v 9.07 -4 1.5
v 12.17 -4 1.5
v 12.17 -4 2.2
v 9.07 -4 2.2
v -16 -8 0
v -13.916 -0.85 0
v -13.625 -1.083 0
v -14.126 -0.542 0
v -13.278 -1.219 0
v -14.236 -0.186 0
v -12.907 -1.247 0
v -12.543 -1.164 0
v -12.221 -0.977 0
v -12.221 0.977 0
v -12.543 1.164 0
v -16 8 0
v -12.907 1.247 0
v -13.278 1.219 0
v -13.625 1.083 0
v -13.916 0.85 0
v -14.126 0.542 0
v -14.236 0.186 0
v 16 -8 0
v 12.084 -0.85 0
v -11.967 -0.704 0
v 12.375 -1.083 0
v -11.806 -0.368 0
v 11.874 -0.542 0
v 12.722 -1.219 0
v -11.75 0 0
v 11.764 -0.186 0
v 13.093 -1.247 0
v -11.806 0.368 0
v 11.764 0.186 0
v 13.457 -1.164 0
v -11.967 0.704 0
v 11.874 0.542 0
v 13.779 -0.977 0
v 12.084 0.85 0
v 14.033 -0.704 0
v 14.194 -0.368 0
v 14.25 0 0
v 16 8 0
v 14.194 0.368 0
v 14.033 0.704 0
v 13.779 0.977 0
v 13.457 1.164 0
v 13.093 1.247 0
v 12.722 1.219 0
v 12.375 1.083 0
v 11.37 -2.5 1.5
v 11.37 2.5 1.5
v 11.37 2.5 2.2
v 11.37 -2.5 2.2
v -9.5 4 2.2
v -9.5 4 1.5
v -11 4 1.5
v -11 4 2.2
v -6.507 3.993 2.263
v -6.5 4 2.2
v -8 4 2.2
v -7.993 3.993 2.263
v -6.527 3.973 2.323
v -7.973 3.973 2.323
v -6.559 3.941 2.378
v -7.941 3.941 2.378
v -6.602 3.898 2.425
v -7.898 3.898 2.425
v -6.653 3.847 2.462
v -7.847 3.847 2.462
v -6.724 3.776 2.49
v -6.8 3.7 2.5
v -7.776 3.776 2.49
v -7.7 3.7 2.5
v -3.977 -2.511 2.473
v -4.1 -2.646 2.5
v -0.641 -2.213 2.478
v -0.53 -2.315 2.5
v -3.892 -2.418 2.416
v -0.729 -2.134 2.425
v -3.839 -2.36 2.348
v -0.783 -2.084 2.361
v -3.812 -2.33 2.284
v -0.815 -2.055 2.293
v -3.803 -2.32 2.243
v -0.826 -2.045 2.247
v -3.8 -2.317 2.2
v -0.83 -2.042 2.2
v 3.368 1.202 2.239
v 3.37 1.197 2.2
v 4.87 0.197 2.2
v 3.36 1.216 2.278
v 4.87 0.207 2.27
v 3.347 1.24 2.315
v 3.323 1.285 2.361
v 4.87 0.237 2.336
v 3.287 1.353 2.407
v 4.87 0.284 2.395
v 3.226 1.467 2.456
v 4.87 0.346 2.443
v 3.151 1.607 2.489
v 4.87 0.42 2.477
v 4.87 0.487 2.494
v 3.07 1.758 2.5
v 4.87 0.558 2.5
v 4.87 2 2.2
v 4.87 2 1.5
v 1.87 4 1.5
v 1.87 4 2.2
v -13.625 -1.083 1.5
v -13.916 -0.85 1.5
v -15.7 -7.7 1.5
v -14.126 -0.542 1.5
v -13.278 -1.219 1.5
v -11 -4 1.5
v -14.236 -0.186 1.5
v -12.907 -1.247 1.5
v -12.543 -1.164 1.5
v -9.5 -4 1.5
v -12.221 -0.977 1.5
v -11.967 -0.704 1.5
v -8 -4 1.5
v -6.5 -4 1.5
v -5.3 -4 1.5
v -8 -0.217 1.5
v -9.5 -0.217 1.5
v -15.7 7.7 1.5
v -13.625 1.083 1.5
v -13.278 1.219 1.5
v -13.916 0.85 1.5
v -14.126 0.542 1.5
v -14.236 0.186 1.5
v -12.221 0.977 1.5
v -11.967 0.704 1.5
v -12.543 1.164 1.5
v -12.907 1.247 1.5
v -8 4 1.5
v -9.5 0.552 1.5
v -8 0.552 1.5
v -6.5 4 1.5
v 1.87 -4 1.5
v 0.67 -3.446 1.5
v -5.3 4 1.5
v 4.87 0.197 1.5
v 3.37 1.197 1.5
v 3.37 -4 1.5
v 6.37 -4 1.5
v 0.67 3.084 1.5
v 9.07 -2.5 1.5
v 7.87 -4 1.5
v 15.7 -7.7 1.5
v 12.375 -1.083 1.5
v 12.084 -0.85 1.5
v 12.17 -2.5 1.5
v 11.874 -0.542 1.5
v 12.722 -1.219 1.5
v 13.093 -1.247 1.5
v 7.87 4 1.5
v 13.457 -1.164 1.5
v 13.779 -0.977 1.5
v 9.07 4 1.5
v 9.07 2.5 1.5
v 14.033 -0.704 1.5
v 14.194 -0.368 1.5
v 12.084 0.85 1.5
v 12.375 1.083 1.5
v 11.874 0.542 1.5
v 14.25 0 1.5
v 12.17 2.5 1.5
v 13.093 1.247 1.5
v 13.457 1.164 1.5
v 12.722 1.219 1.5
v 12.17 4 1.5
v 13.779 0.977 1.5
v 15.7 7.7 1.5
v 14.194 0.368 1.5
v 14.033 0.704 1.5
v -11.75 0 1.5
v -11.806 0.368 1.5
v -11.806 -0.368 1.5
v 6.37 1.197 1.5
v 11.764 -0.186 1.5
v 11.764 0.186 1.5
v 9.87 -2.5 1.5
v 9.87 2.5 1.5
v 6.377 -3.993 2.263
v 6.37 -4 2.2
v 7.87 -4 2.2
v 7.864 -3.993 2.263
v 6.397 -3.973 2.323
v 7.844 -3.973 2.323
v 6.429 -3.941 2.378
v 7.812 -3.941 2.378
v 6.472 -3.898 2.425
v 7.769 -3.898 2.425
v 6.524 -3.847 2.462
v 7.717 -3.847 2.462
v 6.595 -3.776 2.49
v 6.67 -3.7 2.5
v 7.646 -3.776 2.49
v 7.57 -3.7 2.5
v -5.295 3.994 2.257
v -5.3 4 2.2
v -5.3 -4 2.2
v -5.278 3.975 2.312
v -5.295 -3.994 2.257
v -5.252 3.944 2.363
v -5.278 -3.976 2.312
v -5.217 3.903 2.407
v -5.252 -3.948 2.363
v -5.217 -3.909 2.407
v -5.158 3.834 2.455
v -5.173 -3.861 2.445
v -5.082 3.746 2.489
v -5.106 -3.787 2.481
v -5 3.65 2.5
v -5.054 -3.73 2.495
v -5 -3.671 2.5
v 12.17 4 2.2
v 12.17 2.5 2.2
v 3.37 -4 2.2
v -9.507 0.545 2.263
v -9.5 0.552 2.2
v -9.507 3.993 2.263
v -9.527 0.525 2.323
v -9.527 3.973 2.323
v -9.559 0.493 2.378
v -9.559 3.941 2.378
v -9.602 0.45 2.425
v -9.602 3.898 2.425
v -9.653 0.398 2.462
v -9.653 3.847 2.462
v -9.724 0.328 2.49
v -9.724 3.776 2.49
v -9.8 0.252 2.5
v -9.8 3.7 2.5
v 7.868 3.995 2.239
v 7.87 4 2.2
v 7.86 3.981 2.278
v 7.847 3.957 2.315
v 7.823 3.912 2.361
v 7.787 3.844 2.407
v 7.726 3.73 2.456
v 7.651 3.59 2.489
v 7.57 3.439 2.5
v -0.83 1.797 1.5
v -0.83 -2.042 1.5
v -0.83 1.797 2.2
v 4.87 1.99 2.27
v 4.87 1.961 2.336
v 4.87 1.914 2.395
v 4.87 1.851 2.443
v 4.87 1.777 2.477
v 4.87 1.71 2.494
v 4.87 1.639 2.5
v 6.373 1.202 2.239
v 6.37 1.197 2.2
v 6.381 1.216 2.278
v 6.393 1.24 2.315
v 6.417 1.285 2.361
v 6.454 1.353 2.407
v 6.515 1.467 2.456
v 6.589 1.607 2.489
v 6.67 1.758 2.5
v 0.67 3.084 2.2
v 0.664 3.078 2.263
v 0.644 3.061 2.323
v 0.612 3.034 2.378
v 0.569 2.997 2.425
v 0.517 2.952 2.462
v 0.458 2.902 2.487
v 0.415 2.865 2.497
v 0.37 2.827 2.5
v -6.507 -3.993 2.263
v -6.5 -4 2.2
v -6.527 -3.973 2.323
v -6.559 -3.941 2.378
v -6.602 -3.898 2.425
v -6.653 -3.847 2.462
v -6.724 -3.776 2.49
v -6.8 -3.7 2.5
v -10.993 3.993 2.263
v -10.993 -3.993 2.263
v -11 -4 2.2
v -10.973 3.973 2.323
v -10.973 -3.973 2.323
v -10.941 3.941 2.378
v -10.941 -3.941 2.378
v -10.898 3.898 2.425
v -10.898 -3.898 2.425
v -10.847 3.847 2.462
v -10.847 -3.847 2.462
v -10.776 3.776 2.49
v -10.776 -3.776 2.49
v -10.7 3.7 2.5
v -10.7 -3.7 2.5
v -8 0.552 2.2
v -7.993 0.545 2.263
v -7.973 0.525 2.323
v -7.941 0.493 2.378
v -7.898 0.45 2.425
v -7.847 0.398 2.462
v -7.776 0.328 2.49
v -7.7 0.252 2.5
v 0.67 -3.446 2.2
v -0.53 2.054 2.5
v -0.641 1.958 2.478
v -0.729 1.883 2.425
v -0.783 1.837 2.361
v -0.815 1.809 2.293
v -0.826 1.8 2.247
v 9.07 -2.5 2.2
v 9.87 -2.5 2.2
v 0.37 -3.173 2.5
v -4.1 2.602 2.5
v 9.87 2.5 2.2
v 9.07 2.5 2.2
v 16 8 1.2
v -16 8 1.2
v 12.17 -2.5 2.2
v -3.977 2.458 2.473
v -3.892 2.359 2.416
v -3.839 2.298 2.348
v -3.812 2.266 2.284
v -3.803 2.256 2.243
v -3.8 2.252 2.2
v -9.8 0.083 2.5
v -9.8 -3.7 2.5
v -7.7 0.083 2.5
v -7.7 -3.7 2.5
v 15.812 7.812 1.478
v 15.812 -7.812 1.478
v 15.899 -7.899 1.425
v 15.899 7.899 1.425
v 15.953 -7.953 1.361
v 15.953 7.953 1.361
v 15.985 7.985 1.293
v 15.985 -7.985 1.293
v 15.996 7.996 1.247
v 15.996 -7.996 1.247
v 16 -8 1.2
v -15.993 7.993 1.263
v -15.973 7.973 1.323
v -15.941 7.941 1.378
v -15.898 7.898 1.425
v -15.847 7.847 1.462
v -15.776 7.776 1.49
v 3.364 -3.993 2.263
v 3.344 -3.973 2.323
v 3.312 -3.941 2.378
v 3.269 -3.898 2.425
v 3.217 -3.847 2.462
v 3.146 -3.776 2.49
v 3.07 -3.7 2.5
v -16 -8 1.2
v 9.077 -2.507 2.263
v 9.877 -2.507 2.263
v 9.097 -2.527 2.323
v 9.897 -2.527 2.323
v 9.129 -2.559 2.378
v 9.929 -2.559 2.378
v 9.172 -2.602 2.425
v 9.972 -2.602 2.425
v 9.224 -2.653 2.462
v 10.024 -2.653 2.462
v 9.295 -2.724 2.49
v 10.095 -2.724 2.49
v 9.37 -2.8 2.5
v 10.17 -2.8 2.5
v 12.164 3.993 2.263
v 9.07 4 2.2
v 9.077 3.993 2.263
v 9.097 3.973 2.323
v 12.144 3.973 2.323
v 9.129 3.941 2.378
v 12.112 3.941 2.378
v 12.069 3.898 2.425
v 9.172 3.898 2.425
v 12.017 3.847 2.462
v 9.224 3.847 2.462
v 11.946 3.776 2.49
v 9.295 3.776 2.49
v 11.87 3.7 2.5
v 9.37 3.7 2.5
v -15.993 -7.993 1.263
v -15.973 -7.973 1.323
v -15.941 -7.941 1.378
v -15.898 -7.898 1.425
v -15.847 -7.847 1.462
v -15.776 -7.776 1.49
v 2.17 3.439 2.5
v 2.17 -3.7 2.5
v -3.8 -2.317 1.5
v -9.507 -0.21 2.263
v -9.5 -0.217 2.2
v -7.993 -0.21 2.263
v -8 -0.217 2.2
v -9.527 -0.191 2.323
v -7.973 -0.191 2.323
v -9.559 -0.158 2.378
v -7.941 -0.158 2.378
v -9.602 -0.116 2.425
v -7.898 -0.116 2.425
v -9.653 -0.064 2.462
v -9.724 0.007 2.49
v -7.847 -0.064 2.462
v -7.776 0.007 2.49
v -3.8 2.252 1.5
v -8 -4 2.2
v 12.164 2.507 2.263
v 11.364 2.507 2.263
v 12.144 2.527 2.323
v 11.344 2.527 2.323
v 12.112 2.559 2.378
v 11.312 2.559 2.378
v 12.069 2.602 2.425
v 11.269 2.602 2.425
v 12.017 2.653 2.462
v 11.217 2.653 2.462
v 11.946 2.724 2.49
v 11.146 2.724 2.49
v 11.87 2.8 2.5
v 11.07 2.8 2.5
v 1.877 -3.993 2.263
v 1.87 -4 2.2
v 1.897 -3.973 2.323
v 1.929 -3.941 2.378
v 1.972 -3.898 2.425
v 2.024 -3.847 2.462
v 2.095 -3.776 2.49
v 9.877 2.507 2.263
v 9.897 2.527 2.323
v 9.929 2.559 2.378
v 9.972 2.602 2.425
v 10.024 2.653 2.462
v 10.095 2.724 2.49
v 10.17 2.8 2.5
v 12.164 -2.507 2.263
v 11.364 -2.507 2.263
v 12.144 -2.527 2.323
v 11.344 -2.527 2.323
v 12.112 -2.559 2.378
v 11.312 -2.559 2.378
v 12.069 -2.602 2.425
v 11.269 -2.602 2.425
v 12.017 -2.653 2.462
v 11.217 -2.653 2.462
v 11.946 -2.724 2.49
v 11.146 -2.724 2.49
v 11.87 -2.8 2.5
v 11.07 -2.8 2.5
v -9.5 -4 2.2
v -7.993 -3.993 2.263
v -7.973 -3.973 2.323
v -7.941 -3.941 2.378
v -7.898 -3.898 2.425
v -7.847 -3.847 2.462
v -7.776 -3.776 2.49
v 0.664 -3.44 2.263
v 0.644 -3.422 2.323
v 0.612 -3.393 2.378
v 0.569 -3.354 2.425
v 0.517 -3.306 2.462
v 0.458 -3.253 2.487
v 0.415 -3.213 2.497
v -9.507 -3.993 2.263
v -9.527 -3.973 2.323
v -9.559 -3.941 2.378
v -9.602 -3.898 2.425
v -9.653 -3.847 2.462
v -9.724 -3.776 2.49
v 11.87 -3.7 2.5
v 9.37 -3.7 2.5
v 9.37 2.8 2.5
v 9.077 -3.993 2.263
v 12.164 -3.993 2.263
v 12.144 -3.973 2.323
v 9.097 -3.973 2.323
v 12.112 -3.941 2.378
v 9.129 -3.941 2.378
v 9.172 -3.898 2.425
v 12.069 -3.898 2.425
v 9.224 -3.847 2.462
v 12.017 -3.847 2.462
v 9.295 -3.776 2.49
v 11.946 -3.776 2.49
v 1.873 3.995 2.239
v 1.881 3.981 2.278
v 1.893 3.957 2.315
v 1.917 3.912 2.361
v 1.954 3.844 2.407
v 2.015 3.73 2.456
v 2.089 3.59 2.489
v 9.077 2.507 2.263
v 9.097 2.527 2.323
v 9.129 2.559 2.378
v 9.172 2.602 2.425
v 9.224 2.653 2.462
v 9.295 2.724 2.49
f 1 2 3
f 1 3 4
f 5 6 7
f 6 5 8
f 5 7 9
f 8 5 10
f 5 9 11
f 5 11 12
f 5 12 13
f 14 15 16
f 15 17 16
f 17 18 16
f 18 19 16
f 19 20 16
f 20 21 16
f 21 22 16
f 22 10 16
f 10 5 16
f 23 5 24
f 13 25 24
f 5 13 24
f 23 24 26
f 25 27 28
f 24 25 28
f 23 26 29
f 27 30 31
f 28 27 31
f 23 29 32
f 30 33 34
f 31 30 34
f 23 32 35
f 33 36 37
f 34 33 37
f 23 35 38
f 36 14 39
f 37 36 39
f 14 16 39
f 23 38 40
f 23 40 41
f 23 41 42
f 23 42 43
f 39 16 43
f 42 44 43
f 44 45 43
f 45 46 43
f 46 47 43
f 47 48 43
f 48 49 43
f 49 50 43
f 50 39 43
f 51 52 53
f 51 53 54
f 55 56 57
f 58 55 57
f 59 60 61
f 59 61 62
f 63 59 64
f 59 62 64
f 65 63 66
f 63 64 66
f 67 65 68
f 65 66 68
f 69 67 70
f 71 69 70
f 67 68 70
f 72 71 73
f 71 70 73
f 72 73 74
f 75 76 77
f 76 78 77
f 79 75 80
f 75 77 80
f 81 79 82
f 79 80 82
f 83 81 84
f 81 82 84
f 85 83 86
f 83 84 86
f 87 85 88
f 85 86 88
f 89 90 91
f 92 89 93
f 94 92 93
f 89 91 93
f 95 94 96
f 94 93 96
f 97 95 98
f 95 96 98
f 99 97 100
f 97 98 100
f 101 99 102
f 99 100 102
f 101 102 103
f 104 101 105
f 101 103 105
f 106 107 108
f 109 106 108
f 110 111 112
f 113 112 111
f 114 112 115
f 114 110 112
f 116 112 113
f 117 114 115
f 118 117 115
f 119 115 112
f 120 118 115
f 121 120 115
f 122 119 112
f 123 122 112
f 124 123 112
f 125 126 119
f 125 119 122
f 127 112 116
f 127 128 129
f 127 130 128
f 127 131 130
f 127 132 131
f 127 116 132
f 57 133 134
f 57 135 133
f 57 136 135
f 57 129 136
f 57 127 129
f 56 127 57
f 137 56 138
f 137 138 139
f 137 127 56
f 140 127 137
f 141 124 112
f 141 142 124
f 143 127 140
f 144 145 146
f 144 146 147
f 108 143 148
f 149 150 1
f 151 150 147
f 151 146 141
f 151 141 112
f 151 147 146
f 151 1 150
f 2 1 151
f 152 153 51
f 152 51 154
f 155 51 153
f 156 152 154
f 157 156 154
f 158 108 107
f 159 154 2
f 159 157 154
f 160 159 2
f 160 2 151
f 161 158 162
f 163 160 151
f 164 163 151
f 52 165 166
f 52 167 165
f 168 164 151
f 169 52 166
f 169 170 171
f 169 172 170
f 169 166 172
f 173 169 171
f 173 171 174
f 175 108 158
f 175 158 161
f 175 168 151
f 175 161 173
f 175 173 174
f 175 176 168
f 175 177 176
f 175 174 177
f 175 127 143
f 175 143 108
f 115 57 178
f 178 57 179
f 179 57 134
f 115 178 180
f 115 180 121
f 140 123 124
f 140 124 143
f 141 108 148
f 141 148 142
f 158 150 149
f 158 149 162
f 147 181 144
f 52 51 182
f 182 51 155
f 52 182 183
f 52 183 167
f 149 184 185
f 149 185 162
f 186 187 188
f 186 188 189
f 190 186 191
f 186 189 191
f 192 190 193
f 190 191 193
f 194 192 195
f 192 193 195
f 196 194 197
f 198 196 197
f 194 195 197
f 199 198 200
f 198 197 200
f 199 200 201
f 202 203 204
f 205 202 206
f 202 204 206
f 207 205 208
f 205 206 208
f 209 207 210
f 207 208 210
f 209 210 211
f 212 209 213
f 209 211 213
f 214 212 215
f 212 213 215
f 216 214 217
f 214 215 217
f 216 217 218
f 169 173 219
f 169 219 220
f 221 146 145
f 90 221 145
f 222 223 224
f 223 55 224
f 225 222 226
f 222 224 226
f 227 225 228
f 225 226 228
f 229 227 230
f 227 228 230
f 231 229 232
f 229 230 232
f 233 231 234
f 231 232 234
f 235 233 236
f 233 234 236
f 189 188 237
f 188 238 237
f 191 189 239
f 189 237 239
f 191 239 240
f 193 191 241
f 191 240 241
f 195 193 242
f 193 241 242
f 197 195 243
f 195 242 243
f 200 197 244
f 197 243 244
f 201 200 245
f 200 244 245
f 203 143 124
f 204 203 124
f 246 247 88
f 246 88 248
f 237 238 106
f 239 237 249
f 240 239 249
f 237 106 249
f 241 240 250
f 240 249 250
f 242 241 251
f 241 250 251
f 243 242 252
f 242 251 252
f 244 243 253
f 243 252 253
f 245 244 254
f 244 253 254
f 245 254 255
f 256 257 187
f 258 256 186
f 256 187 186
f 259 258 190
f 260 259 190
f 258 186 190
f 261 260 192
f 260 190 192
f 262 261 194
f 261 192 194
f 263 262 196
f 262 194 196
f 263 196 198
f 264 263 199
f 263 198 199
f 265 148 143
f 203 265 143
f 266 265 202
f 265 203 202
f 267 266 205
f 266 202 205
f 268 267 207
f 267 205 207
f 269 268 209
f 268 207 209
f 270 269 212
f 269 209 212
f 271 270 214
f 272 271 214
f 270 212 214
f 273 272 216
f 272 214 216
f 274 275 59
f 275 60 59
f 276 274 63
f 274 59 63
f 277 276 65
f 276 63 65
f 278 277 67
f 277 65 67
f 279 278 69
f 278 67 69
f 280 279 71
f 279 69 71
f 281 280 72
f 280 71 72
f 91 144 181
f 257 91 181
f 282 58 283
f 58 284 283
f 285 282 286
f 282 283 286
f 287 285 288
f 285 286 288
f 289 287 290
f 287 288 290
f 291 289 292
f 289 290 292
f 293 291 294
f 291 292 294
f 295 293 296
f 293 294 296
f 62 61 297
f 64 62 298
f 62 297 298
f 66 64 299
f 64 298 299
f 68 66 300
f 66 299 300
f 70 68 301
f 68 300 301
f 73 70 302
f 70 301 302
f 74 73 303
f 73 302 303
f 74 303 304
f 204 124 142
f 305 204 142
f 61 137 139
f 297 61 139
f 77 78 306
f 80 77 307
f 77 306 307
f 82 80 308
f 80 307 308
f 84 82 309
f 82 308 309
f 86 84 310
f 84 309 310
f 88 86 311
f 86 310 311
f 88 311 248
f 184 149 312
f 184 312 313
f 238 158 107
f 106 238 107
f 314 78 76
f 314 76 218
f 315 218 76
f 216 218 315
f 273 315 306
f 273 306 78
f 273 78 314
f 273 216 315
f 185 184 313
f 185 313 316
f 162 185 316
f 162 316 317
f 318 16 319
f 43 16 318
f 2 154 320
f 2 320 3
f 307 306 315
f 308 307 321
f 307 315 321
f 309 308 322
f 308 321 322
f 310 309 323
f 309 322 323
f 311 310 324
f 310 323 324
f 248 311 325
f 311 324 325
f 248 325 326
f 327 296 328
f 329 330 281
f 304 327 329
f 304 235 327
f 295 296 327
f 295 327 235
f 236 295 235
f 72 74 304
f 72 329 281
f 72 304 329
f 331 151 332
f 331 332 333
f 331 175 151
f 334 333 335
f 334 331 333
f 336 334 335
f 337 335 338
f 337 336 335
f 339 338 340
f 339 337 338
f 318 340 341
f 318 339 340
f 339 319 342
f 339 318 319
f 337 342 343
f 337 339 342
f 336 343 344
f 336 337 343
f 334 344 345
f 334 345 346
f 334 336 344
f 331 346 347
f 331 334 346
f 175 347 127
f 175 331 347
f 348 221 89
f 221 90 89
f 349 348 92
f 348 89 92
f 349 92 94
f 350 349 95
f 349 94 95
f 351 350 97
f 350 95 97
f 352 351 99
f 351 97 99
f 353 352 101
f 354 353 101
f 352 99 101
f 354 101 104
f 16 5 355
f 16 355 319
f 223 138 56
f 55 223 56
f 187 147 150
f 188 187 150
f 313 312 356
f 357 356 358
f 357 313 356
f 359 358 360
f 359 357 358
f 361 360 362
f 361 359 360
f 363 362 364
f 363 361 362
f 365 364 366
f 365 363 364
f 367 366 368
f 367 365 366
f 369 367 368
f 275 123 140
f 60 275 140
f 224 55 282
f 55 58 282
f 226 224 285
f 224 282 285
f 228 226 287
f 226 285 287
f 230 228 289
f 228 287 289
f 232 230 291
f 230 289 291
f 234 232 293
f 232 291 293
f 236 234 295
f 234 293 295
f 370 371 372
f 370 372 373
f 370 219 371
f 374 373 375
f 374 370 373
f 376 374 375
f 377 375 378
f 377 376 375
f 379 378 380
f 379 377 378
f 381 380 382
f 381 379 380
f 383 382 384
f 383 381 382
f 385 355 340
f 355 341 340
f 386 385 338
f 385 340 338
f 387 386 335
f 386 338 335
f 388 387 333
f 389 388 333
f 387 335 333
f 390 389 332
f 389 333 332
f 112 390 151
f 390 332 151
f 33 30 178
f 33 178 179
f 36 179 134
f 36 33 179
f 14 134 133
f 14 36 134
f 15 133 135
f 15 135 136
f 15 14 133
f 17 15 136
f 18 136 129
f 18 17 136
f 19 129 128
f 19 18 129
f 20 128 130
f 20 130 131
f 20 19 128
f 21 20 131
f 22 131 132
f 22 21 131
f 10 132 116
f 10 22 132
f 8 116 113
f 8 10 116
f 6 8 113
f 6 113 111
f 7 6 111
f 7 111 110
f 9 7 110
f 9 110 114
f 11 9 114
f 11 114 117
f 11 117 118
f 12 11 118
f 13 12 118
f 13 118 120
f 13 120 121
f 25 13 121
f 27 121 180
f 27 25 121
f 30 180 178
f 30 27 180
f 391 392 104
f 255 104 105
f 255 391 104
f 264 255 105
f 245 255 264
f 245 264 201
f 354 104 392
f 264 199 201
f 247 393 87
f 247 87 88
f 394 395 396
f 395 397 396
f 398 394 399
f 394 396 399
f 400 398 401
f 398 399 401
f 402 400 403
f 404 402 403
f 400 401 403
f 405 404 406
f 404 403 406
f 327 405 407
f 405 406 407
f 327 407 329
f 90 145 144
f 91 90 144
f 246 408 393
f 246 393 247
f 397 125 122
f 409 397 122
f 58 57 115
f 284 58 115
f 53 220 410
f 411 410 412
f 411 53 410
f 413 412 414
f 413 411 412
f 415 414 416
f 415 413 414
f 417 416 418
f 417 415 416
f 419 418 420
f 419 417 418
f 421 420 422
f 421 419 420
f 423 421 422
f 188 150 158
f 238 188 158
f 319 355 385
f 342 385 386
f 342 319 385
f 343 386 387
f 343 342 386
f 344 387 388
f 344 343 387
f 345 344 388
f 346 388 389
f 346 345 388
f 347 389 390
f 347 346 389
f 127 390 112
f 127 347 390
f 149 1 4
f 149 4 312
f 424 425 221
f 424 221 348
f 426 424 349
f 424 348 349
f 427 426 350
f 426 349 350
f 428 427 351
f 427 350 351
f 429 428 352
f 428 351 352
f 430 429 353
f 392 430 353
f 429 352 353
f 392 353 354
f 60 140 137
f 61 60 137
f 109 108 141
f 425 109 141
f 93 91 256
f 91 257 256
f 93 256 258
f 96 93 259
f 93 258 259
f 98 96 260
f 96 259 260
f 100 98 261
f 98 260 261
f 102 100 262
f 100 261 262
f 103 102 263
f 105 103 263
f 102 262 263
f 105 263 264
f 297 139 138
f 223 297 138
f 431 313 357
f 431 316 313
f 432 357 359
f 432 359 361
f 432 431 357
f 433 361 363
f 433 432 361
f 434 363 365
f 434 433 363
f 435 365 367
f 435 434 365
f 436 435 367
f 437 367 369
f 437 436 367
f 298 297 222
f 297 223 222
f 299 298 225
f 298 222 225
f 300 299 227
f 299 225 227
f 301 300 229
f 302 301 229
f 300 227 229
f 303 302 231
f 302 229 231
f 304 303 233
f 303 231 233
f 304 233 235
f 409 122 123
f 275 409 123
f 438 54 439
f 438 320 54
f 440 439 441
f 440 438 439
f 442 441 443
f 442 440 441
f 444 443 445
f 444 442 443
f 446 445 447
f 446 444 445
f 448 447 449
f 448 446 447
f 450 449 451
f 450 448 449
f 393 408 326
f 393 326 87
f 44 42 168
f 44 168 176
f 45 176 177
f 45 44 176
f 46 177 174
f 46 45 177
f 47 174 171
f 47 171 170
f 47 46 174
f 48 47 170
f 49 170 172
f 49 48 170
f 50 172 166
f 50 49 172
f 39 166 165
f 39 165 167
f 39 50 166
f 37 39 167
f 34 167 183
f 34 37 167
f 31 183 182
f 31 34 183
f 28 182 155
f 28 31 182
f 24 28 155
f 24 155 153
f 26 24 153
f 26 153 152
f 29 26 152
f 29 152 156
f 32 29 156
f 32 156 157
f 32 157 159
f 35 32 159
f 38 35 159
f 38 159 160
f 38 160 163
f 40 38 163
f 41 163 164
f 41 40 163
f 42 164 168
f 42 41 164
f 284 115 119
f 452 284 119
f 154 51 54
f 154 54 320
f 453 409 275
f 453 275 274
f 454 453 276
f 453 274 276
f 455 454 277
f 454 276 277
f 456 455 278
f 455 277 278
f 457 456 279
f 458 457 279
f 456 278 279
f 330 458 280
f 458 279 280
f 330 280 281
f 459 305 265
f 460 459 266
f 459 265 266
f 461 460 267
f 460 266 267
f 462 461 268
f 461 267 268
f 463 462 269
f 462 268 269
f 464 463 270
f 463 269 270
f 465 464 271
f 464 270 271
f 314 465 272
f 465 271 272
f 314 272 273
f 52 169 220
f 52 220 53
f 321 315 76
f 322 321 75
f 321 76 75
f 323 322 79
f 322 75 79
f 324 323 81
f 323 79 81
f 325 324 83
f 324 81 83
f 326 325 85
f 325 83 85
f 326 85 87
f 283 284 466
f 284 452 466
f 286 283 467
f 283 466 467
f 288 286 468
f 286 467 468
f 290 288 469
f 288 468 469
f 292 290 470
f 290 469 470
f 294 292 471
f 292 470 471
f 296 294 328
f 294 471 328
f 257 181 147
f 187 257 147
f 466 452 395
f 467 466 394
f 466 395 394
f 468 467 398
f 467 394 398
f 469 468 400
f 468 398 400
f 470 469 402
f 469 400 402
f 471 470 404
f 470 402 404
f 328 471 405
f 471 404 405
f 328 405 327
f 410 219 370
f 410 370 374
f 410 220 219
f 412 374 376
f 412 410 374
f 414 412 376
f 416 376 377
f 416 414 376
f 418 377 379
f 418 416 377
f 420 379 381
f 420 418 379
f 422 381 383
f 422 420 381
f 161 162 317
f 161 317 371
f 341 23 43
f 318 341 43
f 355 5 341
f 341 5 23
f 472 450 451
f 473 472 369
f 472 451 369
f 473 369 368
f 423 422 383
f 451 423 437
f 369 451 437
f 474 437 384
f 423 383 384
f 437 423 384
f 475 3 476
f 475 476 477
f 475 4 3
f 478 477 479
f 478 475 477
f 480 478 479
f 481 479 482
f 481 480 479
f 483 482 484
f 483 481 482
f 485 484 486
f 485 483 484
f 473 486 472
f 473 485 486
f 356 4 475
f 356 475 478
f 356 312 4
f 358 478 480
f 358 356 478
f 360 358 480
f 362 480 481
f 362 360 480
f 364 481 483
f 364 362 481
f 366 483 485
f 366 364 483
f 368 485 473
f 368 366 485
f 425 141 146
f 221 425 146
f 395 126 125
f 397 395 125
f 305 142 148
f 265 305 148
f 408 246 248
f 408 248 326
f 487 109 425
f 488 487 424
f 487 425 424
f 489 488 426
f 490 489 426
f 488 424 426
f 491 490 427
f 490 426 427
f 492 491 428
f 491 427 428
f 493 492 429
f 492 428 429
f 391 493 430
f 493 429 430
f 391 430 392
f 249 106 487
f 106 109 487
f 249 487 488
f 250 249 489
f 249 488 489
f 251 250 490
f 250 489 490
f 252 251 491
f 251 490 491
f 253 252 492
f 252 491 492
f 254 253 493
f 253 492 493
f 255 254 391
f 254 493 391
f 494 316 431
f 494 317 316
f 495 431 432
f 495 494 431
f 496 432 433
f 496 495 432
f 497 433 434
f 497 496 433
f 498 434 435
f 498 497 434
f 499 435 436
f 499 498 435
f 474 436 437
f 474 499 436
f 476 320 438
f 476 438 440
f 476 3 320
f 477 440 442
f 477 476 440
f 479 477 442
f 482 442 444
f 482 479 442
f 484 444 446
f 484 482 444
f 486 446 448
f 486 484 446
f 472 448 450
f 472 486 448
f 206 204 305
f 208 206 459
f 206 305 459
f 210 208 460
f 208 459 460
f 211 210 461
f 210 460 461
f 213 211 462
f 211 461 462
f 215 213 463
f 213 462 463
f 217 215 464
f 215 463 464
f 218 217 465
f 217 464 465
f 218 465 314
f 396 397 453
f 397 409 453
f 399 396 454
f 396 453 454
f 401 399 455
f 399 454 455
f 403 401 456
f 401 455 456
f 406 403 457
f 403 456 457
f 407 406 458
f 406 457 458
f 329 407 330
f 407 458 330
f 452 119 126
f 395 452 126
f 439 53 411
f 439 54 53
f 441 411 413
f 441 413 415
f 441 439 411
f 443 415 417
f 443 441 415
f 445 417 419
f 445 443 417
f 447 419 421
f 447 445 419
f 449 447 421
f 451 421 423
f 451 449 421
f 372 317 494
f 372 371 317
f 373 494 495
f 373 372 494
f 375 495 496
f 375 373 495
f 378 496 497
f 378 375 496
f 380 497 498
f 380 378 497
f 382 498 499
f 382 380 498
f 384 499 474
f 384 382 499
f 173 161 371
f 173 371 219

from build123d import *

# Parameters (mm, degrees)
SKETCH_1_W      = 32
SKETCH_1_H      = 16
SKETCH_1_R      = 1.25
EXTRUDE_1_DEPTH = 1.5
EXTRUDE_2_DEPTH = 1
FILLET_2_R      = 0.3


with BuildPart() as part:
    # Эскиз1 → Бобышка-Вытянуть1 (new body)
    with BuildSketch(Plane.XY):
        Rectangle(SKETCH_1_W, SKETCH_1_H)
        with Locations((-13, 0)):
            Circle(SKETCH_1_R, mode=Mode.SUBTRACT)
        with Locations((13, 0)):
            Circle(SKETCH_1_R, mode=Mode.SUBTRACT)
    extrude(amount=EXTRUDE_1_DEPTH)

    # Эскиз3 → Бобышка-Вытянуть2 (add)
    # profile 1 of 4: a face of its own
    with BuildSketch(Plane.XY.offset(1.5)):
        Polygon((-11, 4), (-11, -4), (-9.5, -4), (-9.5, -0.217121743), (-8, -0.217121743), (-8, -4), (-6.5, -4), (-6.5, 4), (-8, 4), (-8, 0.55188973), (-9.5, 0.55188973), (-9.5, 4), align=None)
    # profile 2 of 4: a face of its own
    with BuildSketch(Plane.XY.offset(1.5)):
        Polygon((-5.3, 4), (-5.3, -4), (0.67028136, -3.446242786), (0.67028136, 3.084011942), align=None)
        Polygon((-3.8, 2.252311448), (-3.8, -2.317138921), (-0.82971864, -2.041638549), (-0.82971864, 1.796597204), align=None, mode=Mode.SUBTRACT)
    # profile 3 of 4: a face of its own
    with BuildSketch(Plane.XY.offset(1.5)):
        Polygon((1.87028136, 4), (1.87028136, -4), (3.37028136, -4), (3.37028136, 1.197224362), (4.87028136, 0.197224362), (6.37028136, 1.197224362), (6.37028136, -4), (7.87028136, -4), (7.87028136, 4), (4.87028136, 2), align=None)
    # profile 4 of 4: a face of its own
    with BuildSketch(Plane.XY.offset(1.5)):
        Polygon((9.07028136, 4), (12.17028136, 4), (12.17028136, 2.5), (11.37028136, 2.5), (11.37028136, -2.5), (12.17028136, -2.5), (12.17028136, -4), (9.07028136, -4), (9.07028136, -2.5), (9.87028136, -2.5), (9.87028136, 2.5), (9.07028136, 2.5), align=None)
    extrude(amount=EXTRUDE_2_DEPTH)

    # Скругление2
    fillet_2_edges = [part.edges().sort_by_distance(p)[0] for p in [
        (16, 0, 1.5),
        (9.07028136, 3.25, 2.5),
        (9.47028136, 2.5, 2.5),
        (9.87028136, 0, 2.5),
        (9.47028136, -2.5, 2.5),
        (9.07028136, -3.25, 2.5),
        (10.62028136, -4, 2.5),
        (12.17028136, -3.25, 2.5),
        (11.77028136, -2.5, 2.5),
        (11.37028136, 0, 2.5),
        (11.77028136, 2.5, 2.5),
        (12.17028136, 3.25, 2.5),
        (10.62028136, 4, 2.5),
        (0, 8, 1.5),
        (-10.25, 4, 2.5),
        (-11, 0, 2.5),
        (-10.25, -4, 2.5),
        (-9.5, -2.108560871, 2.5),
        (-8.75, -0.217121743, 2.5),
        (-8, -2.108560871, 2.5),
        (-7.25, -4, 2.5),
        (-6.5, 0, 2.5),
        (-7.25, 4, 2.5),
        (-8, 2.275944865, 2.5),
        (-8.75, 0.55188973, 2.5),
        (-9.5, 2.275944865, 2.5),
        (-16, 0, 1.5),
        (-2.31485932, 3.542005971, 2.5),
        (-5.3, 0, 2.5),
        (-2.31485932, -3.723121393, 2.5),
        (0.67028136, -0.181115422, 2.5),
        (-2.31485932, 2.024454326, 2.5),
        (-3.8, -0.032413737, 2.5),
        (-2.31485932, -2.179388735, 2.5),
        (-0.82971864, -0.122520673, 2.5),
        (0, -8, 1.5),
        (2.62028136, -4, 2.5),
        (3.37028136, -1.401387819, 2.5),
        (4.12028136, 0.697224362, 2.5),
        (5.62028136, 0.697224362, 2.5),
        (6.37028136, -1.401387819, 2.5),
        (7.12028136, -4, 2.5),
        (7.87028136, 0, 2.5),
        (6.37028136, 3, 2.5),
        (3.37028136, 3, 2.5),
        (1.87028136, 0, 2.5),
    ]]
    fillet(fillet_2_edges, radius=FILLET_2_R)


solid = part.part
